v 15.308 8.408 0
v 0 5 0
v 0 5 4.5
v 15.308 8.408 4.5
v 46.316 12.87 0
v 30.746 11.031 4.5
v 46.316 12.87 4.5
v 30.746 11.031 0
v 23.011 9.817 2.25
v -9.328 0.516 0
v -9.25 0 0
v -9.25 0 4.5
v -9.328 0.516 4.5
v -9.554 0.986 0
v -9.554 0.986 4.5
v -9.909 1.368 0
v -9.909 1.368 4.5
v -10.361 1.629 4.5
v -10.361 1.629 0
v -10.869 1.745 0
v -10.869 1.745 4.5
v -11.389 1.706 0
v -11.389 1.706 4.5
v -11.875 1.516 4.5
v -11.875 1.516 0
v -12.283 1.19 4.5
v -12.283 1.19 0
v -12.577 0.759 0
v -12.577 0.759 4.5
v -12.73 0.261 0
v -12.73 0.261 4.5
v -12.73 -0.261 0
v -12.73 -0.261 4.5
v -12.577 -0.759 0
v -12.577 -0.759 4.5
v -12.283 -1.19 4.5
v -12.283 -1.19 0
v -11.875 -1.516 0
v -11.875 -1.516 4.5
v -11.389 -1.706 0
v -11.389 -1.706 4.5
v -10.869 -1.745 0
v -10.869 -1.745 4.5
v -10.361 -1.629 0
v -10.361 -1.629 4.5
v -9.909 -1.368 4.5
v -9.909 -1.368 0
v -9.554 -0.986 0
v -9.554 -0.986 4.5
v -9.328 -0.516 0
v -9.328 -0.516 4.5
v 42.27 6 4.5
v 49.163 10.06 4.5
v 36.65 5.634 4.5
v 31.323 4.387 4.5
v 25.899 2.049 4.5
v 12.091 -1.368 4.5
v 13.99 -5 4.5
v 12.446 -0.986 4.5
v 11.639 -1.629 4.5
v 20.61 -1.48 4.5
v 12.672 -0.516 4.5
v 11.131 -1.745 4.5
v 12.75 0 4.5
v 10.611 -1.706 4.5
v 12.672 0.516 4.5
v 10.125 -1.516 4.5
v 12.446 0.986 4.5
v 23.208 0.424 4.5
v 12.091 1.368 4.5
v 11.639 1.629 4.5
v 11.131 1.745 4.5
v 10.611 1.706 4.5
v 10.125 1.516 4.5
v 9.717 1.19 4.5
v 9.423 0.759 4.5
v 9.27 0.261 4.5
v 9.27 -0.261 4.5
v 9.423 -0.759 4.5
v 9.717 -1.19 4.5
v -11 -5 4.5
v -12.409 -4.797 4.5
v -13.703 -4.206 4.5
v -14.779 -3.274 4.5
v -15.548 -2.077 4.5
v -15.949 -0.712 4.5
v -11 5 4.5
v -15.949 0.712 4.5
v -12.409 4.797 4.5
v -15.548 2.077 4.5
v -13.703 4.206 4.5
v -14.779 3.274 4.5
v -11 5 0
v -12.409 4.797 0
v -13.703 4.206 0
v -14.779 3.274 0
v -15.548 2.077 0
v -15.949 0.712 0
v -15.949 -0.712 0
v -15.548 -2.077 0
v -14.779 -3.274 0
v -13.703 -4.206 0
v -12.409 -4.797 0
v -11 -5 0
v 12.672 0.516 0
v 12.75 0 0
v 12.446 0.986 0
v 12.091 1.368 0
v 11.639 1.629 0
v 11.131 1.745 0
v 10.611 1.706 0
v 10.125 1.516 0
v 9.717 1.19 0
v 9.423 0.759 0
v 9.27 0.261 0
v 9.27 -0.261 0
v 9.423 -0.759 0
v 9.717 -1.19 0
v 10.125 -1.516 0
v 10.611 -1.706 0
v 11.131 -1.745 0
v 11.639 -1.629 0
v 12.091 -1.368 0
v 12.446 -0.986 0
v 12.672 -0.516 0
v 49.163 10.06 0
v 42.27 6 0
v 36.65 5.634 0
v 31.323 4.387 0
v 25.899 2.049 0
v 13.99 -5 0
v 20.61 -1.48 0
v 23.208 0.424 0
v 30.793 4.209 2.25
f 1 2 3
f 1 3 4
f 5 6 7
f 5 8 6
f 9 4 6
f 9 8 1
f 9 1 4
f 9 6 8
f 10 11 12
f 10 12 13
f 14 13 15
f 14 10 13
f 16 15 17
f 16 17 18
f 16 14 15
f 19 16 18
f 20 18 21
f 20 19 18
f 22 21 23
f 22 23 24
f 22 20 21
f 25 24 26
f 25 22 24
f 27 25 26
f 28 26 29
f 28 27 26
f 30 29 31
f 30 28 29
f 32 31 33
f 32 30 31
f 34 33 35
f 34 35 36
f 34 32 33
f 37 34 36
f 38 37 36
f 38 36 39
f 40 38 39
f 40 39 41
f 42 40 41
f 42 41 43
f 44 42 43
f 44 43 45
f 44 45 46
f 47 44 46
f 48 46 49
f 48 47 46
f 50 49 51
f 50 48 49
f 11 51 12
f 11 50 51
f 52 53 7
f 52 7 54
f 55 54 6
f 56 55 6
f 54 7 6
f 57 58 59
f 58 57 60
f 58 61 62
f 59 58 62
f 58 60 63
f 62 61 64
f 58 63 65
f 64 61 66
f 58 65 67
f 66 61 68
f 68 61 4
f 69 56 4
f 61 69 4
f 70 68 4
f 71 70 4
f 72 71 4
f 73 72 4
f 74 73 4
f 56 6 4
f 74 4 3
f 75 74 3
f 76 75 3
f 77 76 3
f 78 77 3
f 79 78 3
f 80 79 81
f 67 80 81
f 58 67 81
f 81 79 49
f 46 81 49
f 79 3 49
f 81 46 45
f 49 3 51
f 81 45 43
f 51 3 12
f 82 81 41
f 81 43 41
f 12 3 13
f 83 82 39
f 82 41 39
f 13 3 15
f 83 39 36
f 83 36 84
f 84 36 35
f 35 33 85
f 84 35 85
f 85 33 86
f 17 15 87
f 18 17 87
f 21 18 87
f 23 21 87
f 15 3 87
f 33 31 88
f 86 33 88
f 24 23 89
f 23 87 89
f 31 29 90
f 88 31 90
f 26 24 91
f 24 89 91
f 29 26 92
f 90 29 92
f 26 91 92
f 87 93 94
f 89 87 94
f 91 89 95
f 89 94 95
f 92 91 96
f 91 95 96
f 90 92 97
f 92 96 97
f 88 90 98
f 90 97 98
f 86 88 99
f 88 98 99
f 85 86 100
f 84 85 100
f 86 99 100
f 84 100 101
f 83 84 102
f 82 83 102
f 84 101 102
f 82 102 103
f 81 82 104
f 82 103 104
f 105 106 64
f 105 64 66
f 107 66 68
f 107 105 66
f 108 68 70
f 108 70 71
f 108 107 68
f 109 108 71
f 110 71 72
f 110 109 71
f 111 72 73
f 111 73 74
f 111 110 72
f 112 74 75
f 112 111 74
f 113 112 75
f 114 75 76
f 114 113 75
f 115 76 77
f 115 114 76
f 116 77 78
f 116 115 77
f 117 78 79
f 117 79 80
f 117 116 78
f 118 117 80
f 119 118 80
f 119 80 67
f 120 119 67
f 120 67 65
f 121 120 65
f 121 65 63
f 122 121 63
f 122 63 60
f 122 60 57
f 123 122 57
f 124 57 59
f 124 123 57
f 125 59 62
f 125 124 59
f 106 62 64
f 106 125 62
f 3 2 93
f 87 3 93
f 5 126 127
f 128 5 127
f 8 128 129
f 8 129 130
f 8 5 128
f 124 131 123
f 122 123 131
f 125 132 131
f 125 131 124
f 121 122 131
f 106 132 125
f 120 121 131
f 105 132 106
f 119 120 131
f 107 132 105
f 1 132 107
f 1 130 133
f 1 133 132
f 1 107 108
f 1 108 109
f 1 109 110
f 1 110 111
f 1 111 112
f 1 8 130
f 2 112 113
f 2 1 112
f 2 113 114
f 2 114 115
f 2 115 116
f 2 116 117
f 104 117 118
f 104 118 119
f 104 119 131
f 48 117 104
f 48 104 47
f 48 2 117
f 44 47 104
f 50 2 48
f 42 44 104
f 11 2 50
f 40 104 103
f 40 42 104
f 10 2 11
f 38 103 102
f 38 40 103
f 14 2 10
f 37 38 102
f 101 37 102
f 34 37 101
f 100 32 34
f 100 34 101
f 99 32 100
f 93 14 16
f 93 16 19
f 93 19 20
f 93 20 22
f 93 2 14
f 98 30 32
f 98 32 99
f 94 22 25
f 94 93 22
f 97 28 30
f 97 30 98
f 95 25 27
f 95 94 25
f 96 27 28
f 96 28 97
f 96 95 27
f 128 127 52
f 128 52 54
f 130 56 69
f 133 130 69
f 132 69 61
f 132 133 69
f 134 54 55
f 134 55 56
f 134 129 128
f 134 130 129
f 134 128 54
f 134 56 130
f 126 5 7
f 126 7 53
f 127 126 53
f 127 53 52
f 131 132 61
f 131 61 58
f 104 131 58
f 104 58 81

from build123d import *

# Parameters (mm, degrees)
SKETCH1_R           = 5
SKETCH1_R_2         = 1.75
BOSS_EXTRUDE1_DEPTH = 4.5
BOSS_EXTRUDE2_START = -4.5
BOSS_EXTRUDE2_DEPTH = 4.5


with BuildPart() as part:
    # Sketch1 → Boss-Extrude1 (new body)
    # profile 1 of 3: a face of its own
    with BuildSketch(Plane.XY):
        with BuildLine():
            Line((11.000000016, 5), (-11, 5))
            ThreePointArc((-11, 5), (-7.464466094, 3.535533906), (-6, 0))
            ThreePointArc((-6, 0), (-7.464466094, -3.535533906), (-11, -5))
            Line((-11, -5), (11, -5))
            ThreePointArc((11, -5), (6, 8e-09), (11.000000016, 5))
        make_face()
    # profile 2 of 3: a face of its own
    with BuildSketch(Plane.XY):
        with Locations((-11, 0)):
            Circle(SKETCH1_R)
        with Locations((-11, 0)):
            Circle(SKETCH1_R_2, mode=Mode.SUBTRACT)
    # profile 3 of 3: a face of its own
    with BuildSketch(Plane.XY):
        with Locations((11, 0)):
            Circle(SKETCH1_R)
        with Locations((11, 0)):
            Circle(SKETCH1_R_2, mode=Mode.SUBTRACT)
    extrude(amount=BOSS_EXTRUDE1_DEPTH)

    # Sketch2 → Boss-Extrude2 (add)
    with BuildSketch(Plane.XY.offset(4.5).offset(BOSS_EXTRUDE2_START)):
        with BuildLine():
            Line((46.316479083, 12.87), (49.163214054, 10.06))
            Line((49.163214054, 10.06), (42.27, 6))
            add(Edge.make_bspline(
                [(42.27, 6), (30.146150748, 6.157348305), (20.61, -1.48)],
                knots=[0, 0, 0, 1, 1, 1], degree=2))
            Line((20.61, -1.48), (13.99, -5))
            Line((13.99, -5), (11, -5))
            ThreePointArc((11, -5), (16, 0), (11, 5))
            Line((11, 5), (0, 5))
            add(Edge.make_bspline(
                [(0, 5), (22.862881716, 10.69974244), (46.316479083, 12.87)],
                knots=[0, 0, 0, 1, 1, 1], degree=2))
        make_face()
    extrude(amount=BOSS_EXTRUDE2_DEPTH)


solid = part.part
